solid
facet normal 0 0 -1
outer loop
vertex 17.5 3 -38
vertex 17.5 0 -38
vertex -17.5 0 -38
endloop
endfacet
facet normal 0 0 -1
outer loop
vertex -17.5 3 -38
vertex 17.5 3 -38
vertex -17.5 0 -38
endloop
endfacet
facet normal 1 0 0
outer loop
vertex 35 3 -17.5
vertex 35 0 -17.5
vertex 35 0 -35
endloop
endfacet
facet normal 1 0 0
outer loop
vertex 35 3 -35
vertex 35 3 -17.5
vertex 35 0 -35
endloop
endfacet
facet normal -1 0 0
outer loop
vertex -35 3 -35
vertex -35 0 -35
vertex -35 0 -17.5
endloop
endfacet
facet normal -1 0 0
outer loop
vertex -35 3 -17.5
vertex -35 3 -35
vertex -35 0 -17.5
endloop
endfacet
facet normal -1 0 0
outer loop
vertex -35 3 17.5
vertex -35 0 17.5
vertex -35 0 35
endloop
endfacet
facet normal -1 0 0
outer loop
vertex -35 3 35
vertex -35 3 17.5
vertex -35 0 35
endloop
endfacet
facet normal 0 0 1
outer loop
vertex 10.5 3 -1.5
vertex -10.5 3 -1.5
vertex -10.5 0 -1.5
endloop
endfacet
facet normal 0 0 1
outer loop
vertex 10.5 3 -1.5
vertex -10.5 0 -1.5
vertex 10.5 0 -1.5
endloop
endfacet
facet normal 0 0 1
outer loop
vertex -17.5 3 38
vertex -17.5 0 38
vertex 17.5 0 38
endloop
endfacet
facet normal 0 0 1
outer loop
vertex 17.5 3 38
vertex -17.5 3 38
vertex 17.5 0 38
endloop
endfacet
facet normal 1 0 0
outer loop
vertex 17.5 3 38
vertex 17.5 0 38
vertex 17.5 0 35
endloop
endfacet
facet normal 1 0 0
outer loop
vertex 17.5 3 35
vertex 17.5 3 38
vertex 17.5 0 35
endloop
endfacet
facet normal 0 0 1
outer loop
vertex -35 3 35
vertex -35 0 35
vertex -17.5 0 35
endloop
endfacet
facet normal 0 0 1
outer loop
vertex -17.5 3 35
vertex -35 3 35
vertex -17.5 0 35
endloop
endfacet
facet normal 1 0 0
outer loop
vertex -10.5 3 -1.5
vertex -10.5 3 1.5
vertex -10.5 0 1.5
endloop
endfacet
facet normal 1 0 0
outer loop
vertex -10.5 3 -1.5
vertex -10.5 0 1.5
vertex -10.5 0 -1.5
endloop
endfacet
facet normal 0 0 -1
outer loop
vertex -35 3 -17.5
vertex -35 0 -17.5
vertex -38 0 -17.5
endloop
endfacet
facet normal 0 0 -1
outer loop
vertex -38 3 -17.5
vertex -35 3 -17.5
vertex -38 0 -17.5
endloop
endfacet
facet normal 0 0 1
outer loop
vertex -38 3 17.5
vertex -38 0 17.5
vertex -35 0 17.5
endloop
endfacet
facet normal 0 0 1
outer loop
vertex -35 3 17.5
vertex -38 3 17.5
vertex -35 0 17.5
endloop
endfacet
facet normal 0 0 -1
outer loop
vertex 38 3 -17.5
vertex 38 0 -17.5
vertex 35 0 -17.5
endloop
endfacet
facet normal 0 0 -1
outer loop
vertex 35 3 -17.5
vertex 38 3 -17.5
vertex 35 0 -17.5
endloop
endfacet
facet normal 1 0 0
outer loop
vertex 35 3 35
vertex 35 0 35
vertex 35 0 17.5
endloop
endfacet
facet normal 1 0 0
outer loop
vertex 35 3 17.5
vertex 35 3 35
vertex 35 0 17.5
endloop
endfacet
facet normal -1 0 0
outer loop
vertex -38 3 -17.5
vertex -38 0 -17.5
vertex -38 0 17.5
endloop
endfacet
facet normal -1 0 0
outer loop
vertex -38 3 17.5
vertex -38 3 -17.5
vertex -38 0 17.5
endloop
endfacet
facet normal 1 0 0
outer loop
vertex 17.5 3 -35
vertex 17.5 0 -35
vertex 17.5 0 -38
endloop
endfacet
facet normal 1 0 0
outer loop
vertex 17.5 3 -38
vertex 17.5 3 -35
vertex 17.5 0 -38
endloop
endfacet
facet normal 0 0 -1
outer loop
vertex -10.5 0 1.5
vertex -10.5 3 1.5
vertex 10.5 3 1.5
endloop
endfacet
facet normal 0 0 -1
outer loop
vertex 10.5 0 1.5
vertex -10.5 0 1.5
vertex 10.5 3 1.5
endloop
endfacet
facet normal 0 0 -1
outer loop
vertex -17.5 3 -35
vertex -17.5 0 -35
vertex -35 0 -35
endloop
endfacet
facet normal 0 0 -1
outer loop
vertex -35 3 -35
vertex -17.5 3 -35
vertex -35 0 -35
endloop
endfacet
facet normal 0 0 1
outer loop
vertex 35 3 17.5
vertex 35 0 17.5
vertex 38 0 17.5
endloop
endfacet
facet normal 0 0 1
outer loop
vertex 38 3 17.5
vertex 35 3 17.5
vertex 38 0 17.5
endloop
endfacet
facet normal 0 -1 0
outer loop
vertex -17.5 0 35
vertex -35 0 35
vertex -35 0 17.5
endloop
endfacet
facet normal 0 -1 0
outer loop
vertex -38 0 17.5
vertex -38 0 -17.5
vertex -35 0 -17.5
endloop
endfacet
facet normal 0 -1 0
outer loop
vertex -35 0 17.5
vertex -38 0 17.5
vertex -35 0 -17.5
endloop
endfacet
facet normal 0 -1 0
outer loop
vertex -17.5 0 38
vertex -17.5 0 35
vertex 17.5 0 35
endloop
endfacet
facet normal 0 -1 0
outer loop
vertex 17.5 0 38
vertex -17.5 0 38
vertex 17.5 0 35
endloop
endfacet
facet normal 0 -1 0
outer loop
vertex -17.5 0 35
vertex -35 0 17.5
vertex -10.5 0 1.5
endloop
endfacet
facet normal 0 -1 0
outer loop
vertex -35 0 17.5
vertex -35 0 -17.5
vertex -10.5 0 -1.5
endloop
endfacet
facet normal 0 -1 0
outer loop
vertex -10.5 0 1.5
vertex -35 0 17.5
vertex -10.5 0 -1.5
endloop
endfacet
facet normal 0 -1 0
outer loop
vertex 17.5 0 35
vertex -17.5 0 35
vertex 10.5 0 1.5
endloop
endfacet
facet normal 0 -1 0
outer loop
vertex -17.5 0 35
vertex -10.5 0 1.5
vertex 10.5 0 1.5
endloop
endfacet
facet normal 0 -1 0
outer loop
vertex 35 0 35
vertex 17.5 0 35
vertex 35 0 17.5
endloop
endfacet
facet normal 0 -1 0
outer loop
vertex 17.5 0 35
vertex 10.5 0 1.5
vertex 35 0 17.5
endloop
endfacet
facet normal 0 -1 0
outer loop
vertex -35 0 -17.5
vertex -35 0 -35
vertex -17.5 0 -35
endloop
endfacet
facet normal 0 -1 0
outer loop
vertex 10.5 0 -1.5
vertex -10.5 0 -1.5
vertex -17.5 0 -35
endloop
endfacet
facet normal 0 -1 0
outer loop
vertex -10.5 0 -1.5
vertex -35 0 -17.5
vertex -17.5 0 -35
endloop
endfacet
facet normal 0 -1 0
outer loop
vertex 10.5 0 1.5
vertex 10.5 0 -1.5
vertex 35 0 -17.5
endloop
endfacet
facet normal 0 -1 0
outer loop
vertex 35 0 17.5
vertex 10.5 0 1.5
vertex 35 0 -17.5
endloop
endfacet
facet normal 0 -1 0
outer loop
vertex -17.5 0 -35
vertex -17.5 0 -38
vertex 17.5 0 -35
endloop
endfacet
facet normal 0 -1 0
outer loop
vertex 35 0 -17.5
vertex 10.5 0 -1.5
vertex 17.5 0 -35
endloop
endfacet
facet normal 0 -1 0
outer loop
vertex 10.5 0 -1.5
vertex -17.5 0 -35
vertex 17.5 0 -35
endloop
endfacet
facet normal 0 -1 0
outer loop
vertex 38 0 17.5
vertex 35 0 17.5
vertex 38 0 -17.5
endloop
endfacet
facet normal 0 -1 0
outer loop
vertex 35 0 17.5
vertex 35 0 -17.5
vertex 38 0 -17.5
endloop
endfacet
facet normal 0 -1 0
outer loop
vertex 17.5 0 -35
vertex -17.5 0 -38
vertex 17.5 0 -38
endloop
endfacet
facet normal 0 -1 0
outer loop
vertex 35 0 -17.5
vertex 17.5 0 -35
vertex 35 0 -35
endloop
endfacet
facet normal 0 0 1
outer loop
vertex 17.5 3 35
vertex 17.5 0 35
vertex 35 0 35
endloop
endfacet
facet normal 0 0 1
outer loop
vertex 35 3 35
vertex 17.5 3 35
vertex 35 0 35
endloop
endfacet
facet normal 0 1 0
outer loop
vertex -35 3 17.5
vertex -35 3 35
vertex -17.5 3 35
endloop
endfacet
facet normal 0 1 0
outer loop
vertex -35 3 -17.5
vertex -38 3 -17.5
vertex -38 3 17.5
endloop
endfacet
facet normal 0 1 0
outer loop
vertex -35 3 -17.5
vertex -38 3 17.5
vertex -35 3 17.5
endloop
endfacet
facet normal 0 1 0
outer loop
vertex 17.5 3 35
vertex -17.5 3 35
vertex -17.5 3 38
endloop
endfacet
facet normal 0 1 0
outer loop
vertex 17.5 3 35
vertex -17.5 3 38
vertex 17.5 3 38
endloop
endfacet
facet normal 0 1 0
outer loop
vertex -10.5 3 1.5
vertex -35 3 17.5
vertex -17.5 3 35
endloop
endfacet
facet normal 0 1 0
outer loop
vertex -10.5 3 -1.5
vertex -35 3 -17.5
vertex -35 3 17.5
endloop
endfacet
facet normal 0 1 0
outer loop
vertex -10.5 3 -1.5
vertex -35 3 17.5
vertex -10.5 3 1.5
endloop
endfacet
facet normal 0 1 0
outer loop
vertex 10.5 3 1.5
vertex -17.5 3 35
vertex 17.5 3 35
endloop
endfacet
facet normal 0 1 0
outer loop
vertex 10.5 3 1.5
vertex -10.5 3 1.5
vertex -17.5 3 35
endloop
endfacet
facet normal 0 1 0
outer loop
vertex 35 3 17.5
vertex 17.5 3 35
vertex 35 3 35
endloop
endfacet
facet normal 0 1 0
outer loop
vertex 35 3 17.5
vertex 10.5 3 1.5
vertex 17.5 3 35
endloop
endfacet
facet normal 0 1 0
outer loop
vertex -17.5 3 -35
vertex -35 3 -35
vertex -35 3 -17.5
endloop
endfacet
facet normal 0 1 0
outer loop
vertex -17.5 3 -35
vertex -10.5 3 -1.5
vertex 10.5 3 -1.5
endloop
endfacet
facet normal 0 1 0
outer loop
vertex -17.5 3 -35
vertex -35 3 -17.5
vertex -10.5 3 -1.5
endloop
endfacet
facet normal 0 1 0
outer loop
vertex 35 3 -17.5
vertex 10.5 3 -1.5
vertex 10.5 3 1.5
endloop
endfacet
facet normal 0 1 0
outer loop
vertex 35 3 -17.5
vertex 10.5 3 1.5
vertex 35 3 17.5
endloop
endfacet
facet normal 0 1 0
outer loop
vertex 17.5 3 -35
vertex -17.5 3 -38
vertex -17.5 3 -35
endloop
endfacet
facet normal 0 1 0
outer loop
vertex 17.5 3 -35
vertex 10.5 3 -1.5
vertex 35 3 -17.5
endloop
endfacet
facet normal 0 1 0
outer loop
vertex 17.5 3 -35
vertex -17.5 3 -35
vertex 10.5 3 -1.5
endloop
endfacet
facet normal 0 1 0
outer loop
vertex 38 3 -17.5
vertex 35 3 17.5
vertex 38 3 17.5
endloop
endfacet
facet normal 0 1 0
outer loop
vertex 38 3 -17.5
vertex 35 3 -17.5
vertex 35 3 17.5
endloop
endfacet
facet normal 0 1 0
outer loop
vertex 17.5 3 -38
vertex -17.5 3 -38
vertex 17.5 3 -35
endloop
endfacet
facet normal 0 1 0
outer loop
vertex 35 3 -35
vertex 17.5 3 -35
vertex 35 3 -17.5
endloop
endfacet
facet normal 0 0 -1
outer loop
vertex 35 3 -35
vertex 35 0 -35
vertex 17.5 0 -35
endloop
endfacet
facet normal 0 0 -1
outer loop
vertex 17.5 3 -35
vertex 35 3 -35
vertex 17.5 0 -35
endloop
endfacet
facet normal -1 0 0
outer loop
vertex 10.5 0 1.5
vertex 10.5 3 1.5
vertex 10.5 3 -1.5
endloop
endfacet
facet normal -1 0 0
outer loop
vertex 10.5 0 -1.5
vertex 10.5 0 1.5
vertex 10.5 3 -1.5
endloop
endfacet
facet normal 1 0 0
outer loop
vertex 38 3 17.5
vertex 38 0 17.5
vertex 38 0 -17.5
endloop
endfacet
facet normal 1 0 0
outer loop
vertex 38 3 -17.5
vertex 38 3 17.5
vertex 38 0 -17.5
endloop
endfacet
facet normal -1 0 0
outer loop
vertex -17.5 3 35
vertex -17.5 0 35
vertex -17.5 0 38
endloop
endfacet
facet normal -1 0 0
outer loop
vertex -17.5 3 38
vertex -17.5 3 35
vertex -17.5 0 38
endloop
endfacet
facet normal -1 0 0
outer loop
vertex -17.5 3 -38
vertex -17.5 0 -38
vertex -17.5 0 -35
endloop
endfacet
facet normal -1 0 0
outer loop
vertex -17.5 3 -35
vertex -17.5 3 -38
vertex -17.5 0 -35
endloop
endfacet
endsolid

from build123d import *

# Parameters (mm, degrees)
BOSS_EXTRUDE1_DEPTH = 3
SKETCH2_W           = 21
SKETCH2_H           = 3
CUT_EXTRUDE1_DEPTH  = 3


with BuildPart() as part:
    # Sketch1 → Boss-Extrude1 (new body)
    with BuildSketch(Plane(origin=(0, 0, 0), x_dir=(1, 0, 0), z_dir=(0, 1, 0))):
        Polygon((-35, -35), (-17.5, -35), (-17.5, -38), (17.5, -38), (17.5, -35), (35, -35), (35, -17.5), (38, -17.5), (38, 17.5), (35, 17.5), (35, 35), (17.5, 35), (17.5, 38), (-17.5, 38), (-17.5, 35), (-35, 35), (-35, 17.5), (-38, 17.5), (-38, -17.5), (-35, -17.5), align=None)
    extrude(amount=BOSS_EXTRUDE1_DEPTH)

    # Sketch2 → Cut-Extrude1 (cut)
    with BuildSketch(Plane(origin=(0, 3, 0), x_dir=(1, 0, 0), z_dir=(0, 1, 0))):
        Rectangle(SKETCH2_W, SKETCH2_H)
    extrude(amount=-CUT_EXTRUDE1_DEPTH, mode=Mode.SUBTRACT)


solid = part.part
